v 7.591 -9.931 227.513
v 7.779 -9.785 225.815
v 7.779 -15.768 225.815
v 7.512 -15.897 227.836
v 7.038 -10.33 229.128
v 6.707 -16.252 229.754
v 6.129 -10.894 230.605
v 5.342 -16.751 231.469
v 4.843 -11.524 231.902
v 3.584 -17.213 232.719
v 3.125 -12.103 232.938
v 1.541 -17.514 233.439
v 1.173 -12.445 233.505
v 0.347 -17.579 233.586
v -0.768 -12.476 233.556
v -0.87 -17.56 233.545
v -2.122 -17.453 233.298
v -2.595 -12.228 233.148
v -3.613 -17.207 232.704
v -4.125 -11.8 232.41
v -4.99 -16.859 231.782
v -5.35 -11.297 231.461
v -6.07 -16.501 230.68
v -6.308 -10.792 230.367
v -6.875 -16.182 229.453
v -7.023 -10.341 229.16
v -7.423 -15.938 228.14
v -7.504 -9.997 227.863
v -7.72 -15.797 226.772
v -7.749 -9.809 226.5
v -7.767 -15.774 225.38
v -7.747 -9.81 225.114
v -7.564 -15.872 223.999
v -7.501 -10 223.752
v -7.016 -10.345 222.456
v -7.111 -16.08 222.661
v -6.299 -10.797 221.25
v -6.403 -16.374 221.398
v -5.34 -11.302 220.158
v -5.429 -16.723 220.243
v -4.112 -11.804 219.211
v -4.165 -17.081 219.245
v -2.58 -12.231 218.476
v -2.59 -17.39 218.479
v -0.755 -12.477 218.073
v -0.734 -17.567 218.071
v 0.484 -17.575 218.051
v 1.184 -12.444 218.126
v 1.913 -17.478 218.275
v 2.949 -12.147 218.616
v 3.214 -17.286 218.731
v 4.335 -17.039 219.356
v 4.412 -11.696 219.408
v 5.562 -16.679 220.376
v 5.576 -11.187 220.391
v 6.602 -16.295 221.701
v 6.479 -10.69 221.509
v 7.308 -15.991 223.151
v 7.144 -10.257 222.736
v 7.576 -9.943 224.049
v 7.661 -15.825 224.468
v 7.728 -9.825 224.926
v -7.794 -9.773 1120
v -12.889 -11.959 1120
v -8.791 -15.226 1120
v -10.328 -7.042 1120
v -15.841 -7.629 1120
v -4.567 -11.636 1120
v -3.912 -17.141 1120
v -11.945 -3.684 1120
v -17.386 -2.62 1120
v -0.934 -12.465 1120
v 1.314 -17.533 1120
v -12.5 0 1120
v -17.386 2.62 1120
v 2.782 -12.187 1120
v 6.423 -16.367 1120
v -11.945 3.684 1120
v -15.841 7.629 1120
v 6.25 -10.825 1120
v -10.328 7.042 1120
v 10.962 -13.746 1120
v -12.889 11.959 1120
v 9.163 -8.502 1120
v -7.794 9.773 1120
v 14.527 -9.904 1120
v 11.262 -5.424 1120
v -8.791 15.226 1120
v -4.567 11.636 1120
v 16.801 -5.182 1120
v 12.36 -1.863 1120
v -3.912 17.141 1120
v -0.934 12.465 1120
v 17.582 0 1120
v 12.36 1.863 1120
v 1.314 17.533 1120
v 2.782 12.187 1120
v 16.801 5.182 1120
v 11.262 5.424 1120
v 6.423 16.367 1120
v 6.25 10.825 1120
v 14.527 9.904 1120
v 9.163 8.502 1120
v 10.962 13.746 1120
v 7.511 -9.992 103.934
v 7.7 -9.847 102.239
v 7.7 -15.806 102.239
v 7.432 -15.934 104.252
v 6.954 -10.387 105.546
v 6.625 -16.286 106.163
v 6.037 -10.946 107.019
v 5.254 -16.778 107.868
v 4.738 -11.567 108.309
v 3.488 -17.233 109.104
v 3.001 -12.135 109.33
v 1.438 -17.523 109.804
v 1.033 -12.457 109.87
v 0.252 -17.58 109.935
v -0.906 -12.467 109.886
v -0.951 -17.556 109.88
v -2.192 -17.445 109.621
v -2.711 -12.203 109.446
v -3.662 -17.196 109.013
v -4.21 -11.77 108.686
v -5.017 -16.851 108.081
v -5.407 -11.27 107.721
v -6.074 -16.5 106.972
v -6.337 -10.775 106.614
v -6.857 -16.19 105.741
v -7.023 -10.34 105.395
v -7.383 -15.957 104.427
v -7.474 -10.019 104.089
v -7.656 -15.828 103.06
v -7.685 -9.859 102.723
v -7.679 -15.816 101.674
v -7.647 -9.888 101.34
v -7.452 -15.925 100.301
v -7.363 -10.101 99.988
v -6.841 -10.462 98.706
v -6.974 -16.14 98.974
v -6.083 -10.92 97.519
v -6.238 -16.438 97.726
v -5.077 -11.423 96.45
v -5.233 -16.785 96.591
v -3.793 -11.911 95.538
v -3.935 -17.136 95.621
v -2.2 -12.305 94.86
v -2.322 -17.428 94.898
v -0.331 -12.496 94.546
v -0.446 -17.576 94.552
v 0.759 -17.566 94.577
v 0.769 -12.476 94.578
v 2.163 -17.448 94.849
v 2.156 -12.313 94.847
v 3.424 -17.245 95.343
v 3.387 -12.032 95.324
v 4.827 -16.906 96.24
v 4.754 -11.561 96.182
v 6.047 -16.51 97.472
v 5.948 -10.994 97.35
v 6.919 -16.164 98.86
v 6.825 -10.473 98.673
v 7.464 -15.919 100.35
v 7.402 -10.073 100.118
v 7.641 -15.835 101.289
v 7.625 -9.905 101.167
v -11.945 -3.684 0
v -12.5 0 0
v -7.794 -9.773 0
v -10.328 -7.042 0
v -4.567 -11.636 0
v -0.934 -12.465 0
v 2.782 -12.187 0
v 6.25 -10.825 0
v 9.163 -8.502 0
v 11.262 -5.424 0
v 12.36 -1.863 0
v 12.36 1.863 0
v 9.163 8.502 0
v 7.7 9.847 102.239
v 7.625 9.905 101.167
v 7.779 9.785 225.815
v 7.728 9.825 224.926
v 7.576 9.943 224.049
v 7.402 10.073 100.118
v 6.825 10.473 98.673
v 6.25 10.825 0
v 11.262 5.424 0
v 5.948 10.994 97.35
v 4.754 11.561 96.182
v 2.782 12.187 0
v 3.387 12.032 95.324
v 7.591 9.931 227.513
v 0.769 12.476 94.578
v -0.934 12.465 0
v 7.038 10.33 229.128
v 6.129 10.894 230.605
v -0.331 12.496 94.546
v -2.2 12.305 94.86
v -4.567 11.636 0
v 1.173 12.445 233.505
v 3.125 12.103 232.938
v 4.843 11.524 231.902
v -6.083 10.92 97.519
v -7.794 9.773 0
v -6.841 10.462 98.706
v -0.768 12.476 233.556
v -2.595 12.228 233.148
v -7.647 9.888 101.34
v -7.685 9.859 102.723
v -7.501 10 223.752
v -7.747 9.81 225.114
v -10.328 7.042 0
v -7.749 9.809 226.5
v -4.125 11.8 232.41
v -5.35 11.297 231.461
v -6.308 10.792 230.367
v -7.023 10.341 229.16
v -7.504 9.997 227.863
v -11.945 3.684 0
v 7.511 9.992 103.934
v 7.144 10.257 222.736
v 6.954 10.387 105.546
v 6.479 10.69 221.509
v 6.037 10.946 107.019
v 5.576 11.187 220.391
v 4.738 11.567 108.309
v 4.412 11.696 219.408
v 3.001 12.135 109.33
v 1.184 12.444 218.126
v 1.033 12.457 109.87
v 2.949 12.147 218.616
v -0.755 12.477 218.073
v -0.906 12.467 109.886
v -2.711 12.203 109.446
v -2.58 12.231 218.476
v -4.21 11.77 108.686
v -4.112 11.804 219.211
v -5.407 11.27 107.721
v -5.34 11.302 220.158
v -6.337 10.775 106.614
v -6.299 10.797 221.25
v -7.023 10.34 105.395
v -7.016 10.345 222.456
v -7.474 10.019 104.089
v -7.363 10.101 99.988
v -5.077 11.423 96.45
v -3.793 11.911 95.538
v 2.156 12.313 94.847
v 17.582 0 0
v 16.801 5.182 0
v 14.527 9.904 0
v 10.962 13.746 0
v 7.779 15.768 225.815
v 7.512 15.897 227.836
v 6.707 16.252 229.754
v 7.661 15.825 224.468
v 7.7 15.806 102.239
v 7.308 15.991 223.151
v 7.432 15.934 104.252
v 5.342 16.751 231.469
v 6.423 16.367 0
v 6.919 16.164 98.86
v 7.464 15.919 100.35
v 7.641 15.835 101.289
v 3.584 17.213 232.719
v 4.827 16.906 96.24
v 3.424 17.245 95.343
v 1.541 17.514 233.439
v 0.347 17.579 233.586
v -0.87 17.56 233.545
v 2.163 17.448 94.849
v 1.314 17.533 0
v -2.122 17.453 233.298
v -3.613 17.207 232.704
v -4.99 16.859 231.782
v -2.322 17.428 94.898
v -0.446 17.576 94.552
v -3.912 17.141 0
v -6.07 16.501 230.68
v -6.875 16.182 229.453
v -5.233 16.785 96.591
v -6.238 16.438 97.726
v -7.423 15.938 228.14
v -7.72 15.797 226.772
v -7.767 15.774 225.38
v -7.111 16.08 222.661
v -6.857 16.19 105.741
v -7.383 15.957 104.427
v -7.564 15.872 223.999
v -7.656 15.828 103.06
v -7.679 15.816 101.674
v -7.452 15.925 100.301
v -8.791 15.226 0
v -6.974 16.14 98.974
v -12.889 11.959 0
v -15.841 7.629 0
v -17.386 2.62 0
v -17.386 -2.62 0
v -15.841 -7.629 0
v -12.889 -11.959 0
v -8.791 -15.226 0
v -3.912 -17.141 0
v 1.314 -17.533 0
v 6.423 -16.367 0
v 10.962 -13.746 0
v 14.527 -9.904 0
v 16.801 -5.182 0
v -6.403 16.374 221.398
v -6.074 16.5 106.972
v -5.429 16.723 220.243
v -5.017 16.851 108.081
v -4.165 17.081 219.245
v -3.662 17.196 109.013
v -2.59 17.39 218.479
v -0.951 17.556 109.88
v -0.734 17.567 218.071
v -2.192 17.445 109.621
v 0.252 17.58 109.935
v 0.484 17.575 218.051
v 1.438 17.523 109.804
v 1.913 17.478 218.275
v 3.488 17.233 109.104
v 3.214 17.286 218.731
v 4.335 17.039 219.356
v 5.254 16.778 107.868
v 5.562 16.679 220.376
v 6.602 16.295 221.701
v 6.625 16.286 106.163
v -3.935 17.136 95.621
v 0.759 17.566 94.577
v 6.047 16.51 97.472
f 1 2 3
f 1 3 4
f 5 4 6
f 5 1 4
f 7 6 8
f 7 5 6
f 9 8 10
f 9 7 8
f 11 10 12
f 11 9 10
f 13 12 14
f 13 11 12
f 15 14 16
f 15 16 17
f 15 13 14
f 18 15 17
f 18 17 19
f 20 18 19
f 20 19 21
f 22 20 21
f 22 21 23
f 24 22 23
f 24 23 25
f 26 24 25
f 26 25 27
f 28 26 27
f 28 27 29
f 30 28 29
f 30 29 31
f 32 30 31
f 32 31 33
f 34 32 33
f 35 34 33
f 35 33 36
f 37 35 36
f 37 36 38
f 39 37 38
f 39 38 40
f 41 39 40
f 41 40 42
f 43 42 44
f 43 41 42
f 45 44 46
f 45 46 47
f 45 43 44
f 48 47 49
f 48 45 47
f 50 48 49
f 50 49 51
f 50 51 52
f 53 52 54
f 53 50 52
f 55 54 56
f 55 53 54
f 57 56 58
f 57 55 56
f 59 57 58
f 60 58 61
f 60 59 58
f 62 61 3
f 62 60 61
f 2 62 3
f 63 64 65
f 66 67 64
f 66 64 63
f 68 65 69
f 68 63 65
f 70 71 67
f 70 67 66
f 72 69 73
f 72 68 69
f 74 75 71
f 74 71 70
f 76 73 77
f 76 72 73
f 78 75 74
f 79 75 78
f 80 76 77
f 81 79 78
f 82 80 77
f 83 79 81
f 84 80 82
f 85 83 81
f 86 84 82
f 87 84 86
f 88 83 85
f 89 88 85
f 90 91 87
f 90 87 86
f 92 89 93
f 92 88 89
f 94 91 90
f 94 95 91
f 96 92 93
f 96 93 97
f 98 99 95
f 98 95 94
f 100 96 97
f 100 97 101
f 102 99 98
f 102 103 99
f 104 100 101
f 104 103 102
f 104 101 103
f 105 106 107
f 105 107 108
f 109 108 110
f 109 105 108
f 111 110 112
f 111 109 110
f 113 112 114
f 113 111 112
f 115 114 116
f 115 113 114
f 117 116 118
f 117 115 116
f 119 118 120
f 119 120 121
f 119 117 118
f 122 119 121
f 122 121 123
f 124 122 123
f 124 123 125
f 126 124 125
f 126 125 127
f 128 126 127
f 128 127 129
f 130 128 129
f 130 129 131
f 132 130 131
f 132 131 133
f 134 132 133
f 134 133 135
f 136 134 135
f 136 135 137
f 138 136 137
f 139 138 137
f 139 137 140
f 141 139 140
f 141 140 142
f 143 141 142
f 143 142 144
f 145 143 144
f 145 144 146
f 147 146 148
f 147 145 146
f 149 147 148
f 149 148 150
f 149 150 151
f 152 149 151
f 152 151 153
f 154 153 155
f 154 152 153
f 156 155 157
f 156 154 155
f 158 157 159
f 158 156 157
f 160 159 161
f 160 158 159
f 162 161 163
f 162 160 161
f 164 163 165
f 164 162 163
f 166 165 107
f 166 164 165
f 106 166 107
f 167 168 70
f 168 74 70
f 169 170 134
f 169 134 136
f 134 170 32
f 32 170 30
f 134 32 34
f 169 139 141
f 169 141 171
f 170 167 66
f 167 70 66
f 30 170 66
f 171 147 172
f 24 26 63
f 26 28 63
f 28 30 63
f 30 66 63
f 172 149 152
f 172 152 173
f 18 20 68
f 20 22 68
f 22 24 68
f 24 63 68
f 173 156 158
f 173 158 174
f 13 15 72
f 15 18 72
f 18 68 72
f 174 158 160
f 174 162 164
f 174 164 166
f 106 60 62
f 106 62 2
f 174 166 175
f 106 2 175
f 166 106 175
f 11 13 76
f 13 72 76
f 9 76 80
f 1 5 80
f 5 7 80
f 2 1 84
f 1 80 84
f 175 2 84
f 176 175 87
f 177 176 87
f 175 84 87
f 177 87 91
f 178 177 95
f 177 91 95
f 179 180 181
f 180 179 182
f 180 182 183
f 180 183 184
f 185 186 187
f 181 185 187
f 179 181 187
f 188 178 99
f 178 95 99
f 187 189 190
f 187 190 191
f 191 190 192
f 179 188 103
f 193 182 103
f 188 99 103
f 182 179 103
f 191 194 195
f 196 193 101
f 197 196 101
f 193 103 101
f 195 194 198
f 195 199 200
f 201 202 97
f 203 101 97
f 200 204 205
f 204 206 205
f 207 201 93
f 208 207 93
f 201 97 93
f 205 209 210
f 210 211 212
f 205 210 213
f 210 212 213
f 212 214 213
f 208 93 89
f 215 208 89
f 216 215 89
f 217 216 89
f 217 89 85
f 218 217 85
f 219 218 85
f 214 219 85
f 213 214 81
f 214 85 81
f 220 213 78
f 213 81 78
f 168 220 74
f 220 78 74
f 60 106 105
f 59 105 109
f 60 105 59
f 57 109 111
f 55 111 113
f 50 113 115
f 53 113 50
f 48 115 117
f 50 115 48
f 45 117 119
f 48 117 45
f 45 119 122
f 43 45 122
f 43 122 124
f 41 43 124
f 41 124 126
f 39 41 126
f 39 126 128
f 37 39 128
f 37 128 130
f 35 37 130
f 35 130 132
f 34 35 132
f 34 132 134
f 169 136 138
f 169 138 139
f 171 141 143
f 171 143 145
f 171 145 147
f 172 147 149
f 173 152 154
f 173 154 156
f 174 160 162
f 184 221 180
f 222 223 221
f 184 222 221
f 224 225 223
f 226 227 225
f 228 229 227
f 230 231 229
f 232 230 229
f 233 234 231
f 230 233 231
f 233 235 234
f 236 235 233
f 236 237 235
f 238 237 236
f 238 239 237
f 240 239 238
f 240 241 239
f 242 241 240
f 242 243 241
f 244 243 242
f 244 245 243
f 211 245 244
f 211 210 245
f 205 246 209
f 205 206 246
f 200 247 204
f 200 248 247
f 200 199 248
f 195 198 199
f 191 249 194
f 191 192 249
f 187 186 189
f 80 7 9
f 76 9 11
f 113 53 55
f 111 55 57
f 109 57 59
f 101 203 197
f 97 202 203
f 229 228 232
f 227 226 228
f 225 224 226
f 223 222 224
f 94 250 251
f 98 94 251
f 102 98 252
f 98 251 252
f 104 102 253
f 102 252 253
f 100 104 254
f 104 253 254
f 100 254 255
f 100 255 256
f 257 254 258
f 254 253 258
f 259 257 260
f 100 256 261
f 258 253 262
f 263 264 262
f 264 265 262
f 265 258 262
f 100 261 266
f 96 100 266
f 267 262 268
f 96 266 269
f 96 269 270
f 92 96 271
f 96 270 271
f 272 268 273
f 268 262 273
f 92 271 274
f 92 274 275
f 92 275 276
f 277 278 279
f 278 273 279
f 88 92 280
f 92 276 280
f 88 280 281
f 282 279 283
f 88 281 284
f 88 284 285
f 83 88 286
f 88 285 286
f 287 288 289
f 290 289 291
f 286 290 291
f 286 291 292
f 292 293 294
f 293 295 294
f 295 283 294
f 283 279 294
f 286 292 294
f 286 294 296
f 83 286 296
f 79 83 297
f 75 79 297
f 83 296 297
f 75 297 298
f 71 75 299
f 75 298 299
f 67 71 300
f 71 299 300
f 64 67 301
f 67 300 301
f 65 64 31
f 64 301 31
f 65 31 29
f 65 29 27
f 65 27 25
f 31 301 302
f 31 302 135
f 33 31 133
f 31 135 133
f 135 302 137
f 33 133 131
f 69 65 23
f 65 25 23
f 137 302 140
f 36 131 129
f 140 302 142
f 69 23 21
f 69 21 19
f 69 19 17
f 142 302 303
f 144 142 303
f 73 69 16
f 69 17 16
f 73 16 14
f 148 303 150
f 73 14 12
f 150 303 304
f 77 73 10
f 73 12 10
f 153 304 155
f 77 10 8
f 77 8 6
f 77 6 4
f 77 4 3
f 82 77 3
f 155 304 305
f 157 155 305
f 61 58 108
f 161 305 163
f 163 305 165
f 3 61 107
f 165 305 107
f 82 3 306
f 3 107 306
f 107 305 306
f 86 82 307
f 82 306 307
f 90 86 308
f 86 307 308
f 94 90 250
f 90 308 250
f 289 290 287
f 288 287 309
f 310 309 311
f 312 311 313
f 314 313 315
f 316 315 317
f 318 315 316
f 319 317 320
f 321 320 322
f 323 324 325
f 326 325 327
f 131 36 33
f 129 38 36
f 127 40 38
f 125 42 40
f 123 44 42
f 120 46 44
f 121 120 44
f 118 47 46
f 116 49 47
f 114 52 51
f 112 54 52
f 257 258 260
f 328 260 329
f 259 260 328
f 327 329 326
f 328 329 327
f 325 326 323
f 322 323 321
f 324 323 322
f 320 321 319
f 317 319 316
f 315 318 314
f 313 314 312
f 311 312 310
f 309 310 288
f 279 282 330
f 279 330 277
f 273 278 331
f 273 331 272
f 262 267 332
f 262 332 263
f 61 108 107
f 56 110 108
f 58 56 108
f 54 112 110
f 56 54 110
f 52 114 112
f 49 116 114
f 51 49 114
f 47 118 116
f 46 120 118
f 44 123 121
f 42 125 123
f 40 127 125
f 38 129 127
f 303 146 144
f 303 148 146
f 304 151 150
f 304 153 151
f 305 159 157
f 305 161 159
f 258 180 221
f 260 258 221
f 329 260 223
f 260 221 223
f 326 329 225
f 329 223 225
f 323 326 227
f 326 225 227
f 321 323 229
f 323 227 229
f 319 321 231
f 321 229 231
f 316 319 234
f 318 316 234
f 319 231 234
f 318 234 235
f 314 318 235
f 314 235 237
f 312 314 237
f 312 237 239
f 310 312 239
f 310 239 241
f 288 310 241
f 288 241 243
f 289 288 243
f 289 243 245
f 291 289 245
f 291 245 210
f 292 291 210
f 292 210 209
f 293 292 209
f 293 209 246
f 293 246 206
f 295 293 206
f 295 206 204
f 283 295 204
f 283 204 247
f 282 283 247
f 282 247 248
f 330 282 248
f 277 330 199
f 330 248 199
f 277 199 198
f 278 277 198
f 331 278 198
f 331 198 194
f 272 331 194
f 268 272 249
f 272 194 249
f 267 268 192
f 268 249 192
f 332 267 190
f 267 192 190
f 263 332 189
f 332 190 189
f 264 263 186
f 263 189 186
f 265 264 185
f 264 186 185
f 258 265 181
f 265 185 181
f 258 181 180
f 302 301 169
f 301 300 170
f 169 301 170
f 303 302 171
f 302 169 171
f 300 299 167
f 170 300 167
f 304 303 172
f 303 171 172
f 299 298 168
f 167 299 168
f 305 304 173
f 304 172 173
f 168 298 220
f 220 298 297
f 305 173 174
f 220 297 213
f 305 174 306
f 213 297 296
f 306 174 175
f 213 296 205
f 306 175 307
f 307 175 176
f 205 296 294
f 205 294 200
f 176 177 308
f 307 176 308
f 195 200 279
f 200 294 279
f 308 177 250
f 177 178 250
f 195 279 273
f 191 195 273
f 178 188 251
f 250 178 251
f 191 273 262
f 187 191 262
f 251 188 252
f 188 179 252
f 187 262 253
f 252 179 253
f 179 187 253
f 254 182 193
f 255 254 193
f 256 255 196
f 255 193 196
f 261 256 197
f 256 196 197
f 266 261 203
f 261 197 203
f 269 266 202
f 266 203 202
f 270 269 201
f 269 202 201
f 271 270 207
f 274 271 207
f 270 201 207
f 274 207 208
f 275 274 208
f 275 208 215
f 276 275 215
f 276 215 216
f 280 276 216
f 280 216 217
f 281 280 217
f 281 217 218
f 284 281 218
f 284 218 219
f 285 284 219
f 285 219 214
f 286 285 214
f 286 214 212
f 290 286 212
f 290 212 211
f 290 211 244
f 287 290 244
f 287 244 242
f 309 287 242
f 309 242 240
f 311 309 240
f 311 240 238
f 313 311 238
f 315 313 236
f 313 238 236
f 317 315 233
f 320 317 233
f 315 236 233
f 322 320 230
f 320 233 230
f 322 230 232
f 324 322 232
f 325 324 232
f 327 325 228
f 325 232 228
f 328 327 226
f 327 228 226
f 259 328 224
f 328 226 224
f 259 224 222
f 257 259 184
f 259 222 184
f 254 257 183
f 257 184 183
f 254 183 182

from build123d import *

# Parameters (mm, degrees)
F0_R     = 17.581987
F1_DEPTH = 1120
F2_D     = 25
F3_R     = 7.699886
F3_R_2   = 7.778907
F4_DEPTH = 100
F5_DEPTH = 25


with BuildPart() as f1:
    # F0 (on Top) → F1 (new body)
    with BuildSketch(Plane.XY):
        Circle(F0_R)
    extrude(amount=F1_DEPTH)

    # F2 (through all)
    with Locations(Plane(origin=(0, 0, 0), x_dir=(1, 0, 0), z_dir=(0, 0, -1))):
        with Locations((0, 0)):
            Hole(F2_D / 2)

    # F3 (on Front) → F4 (cut)
    with BuildSketch(Plane.XZ):
        with Locations((0, 102.239177)):
            Circle(F3_R)
        with Locations((0, 225.81467)):
            Circle(F3_R_2)
    extrude(amount=-F4_DEPTH, mode=Mode.SUBTRACT)

    # F3 (on Front) → F5 (cut)
    with BuildSketch(Plane.XZ):
        with Locations((0, 102.239177)):
            Circle(F3_R)
        with Locations((0, 225.81467)):
            Circle(F3_R_2)
    extrude(amount=F5_DEPTH, mode=Mode.SUBTRACT)


solid = f1.part
